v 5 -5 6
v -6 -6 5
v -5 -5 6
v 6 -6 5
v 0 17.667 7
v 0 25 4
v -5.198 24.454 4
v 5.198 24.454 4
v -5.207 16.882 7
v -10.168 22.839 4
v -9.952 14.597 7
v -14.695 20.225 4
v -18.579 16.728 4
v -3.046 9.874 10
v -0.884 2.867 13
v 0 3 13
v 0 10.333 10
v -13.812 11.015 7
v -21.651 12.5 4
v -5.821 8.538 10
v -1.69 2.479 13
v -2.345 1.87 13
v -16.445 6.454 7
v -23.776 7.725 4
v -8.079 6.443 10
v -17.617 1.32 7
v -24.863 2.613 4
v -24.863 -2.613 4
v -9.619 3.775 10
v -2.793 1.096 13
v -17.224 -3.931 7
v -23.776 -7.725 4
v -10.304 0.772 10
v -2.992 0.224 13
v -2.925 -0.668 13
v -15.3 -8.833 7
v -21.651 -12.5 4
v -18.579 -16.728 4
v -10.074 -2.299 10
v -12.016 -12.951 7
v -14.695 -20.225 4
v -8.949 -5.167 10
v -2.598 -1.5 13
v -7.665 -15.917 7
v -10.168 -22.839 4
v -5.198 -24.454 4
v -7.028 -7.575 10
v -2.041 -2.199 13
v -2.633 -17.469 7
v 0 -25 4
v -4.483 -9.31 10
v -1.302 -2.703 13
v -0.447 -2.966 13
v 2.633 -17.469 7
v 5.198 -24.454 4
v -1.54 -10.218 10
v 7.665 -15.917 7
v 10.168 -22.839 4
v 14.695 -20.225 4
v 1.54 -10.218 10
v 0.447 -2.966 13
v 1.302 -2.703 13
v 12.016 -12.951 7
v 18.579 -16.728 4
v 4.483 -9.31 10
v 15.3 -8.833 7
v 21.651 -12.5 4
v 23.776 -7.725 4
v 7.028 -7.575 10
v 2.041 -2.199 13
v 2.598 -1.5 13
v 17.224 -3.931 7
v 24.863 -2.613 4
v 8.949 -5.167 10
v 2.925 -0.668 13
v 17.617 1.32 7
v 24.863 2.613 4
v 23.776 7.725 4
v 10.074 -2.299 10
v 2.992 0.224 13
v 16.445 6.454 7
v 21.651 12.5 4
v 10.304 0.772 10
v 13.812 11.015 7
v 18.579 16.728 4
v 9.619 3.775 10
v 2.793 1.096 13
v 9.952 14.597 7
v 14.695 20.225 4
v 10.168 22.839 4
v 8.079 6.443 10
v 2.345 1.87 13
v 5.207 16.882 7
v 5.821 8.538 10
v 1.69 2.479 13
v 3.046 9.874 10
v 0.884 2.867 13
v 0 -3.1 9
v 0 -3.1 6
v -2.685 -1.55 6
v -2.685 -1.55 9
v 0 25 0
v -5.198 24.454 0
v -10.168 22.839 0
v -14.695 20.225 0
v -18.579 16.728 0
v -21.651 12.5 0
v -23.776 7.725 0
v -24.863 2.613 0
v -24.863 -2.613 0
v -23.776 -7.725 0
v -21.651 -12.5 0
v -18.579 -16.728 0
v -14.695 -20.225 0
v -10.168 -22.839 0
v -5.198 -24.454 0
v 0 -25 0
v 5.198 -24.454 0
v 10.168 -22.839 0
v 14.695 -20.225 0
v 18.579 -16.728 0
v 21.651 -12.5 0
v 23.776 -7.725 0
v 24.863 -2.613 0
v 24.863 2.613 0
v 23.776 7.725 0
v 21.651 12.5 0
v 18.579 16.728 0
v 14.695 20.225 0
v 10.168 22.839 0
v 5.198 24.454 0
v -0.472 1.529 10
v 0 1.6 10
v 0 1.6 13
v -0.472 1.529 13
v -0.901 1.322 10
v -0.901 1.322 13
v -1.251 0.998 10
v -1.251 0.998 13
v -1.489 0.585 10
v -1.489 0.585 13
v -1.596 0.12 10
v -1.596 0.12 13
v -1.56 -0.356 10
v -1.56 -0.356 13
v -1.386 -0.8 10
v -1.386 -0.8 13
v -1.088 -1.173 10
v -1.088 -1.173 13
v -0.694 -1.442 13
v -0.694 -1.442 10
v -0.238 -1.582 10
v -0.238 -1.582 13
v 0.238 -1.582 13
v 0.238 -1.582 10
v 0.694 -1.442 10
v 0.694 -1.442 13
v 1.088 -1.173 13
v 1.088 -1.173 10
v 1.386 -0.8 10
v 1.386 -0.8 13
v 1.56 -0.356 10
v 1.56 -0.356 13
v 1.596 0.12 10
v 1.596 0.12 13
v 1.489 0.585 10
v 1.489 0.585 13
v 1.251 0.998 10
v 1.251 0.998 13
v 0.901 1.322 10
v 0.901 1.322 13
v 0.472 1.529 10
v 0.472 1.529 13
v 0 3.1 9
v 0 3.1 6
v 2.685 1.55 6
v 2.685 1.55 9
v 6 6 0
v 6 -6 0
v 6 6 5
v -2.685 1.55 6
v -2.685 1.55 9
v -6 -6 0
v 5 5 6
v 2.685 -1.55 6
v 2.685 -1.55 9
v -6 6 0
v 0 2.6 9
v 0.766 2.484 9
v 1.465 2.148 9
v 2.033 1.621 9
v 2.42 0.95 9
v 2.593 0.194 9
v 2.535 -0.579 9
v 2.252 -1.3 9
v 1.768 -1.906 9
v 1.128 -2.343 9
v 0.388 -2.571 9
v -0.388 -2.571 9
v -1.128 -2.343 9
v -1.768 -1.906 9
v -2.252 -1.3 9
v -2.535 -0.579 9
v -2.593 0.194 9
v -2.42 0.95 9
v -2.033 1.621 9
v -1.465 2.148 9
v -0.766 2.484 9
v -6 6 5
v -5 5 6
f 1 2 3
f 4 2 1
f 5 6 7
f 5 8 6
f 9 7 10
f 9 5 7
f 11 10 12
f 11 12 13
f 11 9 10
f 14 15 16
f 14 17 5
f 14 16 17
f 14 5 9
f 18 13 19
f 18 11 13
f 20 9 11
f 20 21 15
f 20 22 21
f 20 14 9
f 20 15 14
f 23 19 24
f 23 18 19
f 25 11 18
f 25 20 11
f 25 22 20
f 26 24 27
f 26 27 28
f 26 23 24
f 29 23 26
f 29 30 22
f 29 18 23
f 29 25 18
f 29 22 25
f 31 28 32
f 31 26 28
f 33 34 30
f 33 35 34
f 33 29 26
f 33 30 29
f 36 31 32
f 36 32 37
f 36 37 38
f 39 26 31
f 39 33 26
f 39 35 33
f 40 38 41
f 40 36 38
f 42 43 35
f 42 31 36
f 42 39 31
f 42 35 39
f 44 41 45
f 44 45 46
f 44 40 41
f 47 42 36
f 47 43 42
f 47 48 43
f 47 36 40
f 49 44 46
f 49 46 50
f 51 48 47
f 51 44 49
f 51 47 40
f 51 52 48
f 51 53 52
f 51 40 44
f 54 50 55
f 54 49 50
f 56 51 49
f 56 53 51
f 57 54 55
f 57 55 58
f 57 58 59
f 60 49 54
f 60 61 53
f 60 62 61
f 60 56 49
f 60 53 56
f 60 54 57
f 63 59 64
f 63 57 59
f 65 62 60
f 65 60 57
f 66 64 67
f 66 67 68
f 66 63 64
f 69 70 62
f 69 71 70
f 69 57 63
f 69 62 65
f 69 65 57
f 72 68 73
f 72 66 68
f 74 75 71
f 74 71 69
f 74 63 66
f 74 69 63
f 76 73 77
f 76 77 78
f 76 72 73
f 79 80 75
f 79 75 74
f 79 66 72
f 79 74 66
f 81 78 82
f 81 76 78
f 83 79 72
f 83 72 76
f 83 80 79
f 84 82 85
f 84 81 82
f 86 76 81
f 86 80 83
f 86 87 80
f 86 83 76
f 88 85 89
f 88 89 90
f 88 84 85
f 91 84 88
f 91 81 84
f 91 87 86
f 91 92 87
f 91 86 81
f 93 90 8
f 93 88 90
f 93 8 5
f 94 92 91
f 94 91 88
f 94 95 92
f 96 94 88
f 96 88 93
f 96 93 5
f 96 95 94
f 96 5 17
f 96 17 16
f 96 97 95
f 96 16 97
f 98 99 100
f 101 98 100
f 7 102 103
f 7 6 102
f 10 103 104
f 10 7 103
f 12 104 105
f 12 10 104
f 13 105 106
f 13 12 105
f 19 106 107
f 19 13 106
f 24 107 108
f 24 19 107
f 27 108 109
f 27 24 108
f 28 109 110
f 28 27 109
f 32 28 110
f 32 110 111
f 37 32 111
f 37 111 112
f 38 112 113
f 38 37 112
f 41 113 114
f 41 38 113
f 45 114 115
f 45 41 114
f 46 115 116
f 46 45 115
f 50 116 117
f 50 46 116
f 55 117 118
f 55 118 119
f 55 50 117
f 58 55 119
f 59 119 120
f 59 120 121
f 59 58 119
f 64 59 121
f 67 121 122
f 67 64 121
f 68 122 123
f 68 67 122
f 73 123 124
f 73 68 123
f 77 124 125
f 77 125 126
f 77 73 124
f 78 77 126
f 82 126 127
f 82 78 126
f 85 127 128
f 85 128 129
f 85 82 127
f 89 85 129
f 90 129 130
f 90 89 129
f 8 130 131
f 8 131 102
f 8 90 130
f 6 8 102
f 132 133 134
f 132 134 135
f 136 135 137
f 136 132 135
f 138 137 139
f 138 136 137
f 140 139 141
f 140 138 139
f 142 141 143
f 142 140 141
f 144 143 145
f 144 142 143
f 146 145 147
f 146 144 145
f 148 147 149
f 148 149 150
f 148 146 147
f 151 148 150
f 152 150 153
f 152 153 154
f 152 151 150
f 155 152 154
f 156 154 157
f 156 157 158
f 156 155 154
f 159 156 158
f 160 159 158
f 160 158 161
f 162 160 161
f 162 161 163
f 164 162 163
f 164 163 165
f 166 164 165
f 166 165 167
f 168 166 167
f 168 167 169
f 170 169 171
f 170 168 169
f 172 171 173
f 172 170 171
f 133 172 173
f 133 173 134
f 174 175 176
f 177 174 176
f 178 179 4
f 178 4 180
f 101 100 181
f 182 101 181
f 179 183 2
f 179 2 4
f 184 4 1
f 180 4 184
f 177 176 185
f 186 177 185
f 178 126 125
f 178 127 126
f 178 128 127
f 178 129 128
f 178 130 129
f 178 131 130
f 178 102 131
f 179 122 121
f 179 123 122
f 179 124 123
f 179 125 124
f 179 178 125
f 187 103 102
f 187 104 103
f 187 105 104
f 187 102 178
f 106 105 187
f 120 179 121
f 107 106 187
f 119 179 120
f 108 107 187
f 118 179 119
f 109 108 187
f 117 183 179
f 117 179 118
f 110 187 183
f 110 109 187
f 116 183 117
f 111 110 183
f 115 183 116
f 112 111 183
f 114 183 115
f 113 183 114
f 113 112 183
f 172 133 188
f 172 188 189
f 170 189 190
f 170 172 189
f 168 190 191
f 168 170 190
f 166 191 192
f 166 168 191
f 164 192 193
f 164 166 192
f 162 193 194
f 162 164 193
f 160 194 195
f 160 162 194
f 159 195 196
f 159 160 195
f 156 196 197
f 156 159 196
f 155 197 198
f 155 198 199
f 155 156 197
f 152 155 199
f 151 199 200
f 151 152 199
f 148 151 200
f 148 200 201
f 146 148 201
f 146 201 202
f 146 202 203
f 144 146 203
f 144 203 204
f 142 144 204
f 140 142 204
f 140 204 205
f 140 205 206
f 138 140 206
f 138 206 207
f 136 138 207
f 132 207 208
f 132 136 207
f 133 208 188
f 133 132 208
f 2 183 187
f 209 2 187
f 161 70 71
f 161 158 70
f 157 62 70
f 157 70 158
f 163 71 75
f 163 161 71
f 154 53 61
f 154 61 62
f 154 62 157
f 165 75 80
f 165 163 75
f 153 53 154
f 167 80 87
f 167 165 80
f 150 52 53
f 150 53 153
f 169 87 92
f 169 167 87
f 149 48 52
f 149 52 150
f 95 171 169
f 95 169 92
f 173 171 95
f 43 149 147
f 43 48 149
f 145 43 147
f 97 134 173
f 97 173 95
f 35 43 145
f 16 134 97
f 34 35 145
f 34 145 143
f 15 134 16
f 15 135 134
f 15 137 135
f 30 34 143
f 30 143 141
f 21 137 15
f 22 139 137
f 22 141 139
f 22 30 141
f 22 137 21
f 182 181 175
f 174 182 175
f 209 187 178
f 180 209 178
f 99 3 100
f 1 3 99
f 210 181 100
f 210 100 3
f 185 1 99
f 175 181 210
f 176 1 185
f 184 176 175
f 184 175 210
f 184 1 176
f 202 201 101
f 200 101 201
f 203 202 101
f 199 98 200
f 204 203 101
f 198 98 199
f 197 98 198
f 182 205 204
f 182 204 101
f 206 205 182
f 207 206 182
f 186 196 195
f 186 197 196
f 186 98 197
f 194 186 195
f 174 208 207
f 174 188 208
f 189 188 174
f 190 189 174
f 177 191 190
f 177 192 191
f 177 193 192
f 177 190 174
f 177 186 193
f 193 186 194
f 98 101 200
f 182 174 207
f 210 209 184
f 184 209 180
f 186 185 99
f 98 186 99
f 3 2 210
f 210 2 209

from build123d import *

# Parameters (mm, degrees)
SKETCH_W        = 12
SKETCH_H        = 12
POCKET_DEPTH    = 6
POCKET001_DEPTH = 3
CHAMFER_SIZE    = 1
CHAMFER001_SIZE = 1


with BuildPart() as part:
    # Sketch002 → Revolution (revolve)
    with BuildSketch(Plane.YZ):
        Polygon((1.6, 13), (1.6, 0), (25, 0), (25, 4), (3, 13), align=None)
    revolve(axis=Axis((0, 0, 0), (0, 0, 1)))

    # Sketch (on Face4 of Revolution) → Pocket (cut)
    with BuildSketch(Plane.YX):
        Rectangle(SKETCH_W, SKETCH_H)
    extrude(amount=-POCKET_DEPTH, mode=Mode.SUBTRACT)

    # Sketch003 (on Face2 of Pocket) → Pocket001 (cut)
    with BuildSketch(Plane.YX.offset(-6)):
        Polygon((3.1, 0), (1.55, 2.684679), (-1.55, 2.684679), (-3.1, 0), (-1.55, -2.684679), (1.55, -2.684679), align=None)
    extrude(amount=-POCKET001_DEPTH, mode=Mode.SUBTRACT)

    # Chamfer
    chamfer_edges = [part.edges().sort_by_distance(p)[0] for p in [
        (0, -6, 6),
        (0, 6, 6),
        (-6, 0, 6),
        (6, 0, 6),
    ]]
    chamfer(chamfer_edges, length=CHAMFER_SIZE)

    # Chamfer001
    chamfer001_edges = [part.edges().sort_by_distance(p)[0] for p in [
        (0, -1.6, 9),
    ]]
    chamfer(chamfer001_edges, length=CHAMFER001_SIZE)


solid = part.part
